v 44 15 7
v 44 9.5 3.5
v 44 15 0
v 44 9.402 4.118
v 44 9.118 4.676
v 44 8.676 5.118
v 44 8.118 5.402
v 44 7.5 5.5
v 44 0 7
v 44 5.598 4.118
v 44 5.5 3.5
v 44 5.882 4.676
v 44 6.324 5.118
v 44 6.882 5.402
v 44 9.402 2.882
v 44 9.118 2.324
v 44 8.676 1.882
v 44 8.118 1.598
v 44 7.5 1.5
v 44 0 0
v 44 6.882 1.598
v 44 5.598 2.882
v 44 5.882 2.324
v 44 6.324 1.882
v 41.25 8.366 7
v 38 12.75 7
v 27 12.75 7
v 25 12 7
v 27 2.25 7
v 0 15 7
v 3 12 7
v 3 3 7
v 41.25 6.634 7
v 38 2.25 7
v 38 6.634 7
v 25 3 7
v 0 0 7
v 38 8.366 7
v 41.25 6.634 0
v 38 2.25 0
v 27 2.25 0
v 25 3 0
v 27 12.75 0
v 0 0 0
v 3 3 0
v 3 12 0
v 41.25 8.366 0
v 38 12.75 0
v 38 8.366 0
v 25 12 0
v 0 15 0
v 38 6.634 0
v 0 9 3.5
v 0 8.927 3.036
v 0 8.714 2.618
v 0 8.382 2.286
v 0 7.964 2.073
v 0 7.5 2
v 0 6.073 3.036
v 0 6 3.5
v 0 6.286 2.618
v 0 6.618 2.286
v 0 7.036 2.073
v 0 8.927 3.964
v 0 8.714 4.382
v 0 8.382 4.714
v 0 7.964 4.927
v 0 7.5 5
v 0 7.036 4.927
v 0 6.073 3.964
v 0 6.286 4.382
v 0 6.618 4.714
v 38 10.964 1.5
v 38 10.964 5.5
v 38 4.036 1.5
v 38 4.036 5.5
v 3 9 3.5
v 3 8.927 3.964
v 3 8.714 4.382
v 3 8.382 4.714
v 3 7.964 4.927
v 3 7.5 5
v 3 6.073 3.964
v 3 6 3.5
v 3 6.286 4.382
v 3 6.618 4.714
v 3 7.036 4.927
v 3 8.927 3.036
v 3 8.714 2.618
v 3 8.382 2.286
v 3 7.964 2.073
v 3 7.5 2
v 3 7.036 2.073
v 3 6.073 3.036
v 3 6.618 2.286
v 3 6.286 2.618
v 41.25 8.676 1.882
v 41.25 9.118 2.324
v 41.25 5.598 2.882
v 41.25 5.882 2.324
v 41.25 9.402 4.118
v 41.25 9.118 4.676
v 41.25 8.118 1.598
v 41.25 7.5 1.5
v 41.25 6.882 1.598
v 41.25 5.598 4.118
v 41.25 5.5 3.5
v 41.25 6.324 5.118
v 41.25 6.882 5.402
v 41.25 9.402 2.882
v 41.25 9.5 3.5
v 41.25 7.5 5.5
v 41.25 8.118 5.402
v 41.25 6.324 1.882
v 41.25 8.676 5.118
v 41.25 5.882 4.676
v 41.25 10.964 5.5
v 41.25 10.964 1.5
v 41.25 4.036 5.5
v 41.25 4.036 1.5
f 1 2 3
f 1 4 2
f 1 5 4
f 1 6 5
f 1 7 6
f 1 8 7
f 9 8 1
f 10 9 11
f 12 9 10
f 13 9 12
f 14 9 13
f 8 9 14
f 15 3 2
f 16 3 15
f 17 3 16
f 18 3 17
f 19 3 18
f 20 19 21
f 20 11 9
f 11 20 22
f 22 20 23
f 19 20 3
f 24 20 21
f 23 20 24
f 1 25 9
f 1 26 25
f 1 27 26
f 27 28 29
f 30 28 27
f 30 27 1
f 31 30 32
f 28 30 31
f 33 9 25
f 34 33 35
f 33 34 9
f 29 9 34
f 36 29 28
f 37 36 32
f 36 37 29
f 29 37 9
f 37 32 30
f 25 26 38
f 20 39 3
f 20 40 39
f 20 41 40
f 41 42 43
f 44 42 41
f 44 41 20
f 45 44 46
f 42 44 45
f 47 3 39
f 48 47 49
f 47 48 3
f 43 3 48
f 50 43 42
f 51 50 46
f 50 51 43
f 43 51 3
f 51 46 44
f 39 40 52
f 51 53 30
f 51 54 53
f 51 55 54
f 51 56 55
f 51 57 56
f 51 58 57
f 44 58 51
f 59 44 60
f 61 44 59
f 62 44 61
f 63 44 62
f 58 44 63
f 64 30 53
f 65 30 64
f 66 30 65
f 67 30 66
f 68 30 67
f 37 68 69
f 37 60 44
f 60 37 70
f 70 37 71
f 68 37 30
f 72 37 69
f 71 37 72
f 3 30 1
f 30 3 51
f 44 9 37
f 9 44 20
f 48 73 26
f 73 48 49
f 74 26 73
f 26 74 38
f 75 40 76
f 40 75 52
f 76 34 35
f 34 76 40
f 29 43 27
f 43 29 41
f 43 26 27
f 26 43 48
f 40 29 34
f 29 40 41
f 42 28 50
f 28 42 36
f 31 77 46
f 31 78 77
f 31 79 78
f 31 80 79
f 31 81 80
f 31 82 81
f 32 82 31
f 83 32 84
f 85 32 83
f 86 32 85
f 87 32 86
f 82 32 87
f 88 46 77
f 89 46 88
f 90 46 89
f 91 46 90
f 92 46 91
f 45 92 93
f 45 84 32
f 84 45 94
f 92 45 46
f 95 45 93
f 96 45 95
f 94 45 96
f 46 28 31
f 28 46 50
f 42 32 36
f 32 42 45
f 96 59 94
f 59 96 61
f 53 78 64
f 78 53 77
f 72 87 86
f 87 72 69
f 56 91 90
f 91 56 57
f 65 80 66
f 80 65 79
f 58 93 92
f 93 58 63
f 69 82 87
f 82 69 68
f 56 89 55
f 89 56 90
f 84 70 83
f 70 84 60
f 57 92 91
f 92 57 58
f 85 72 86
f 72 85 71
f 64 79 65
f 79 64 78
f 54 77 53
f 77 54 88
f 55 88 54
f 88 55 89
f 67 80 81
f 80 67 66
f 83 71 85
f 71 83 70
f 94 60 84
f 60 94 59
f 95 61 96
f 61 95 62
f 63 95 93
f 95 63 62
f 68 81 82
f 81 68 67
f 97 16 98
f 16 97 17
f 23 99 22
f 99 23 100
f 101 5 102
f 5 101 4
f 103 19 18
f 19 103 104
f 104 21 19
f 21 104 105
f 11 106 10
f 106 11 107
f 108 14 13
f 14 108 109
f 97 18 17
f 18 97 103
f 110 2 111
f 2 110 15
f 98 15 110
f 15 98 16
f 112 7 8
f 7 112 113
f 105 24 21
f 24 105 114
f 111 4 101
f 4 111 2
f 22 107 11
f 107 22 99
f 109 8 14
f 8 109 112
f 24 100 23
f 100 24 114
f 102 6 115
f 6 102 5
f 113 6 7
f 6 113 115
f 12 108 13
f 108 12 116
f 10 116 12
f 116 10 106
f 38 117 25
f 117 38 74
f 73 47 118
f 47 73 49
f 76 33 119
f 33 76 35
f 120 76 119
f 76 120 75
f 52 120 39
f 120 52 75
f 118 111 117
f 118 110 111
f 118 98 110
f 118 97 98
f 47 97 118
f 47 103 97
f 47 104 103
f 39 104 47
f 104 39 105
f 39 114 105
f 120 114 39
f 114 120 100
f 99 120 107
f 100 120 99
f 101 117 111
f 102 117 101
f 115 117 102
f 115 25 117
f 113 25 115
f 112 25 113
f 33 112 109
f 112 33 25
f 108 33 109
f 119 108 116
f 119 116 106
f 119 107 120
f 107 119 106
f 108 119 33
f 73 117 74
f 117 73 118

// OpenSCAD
// file: ../basic_scad/config.scad
// Author: Mihai Oltean, www.tcreate.org, mihai.oltean@gmail.com
// More details: jenny5.org
// Source: github.com/jenny5-robot
// MIT License
//--------------------------------------------------------------

aluminium_color = "Silver";
screw_color = "LightSlateGray";
frame_color = aluminium_color;
shaft_color = "Silver";
plastic_color = "LimeGreen";
pulley_color = "DarkSlateGray";
// file: ../basic_scad/utils.scad
// Author: Mihai Oltean, www.tcreate.org, mihai.oltean@gmail.com
// More details: jenny5.org
// Source: github.com/jenny5-robot
// MIT License
//--------------------------------------------------------------

module colt(radius, height)
{
	difference(){
		cube ([radius, radius, height]);
		cylinder	(h = height, r = radius, $fn = 30);
	}
}
/////////////////////////////////////////////////////////////////////////////////////////////////////////////////////////
module colt_sferic(radius)
{
	difference(){
		cube ([radius, radius, radius]);
		sphere(r = radius, $fn = 40);
	}
}
/////////////////////////////////////////////////////////////////////////////////////////////////////////////////////////
module coloana_sferica(height, radius)
{
		difference(){
			cube ([height, height, height]);
			cylinder(h= height, r = radius, $fn = 50);
		}
}
/////////////////////////////////////////////////////////////////////////////////////////////////////////////////////////
// file: ../basic_scad/params_basic_components.scad
// Author: Mihai Oltean, www.tcreate.org, mihai.oltean@gmail.com
// More details: jenny5.org
// Source: github.com/jenny5-robot
// MIT License
//--------------------------------------------------------------

spring_length = 20;

smooth_rod_8_radius = 4;
smooth_rod_10_radius = 5;
smooth_rod_12_radius = 6;

tolerance = 0.1;
display_tolerance = 1;

overlap_tolerance = 0.01;


wall_thick_1 = 1;
wall_thick_2 = 2;
wall_thick_3 = 3;
wall_thick_4 = 4;
wall_thick_5 = 5;
wall_thick_5_5 = 5.5;
wall_thick_6 = 6;
wall_thick_7 = 7;
wall_thick_8 = 8;
wall_thick_9 = 9;
wall_thick_10 = 10;
wall_thick_12 = 10;

wrench_radius = 11;

ghidaj_radius = 4;
ghidaj_radius_12 = 6;

canal_diameter = 8.22;
canal_height = 2.2;

filament_radius = 0.9;

bowden_tube_radius = 2.5;

m3_tolerance = 0.1;

latura_mare_L = 40;
latura_mica_L = 15;
grosime_perete_L = 3;

latura_L_50x50 = 50;
latura_L_40x40 = 40;

latura_U_50x50 = 50;
latura_U_40x40 = 40;


tolerance_z = [0, 0, tolerance];
tolerance_x = [tolerance, 0, 0];
tolerance_y = [0, tolerance, 0];

display_tolerance_z = [0, 0, display_tolerance];
display_tolerance_x = [display_tolerance, 0, 0];
display_tolerance_y = [0, display_tolerance, 0];
// file: ../basic_scad/params_screws_nuts_washers.scad
m2_screw_radius = 1;
m2_nut_radius = 2.2;
m2_nut_height = 1.6;
m2_nut_thick = m2_nut_height;

m3_screw_radius = 1.5;
m3_nut_radius = 3.1;
m3_nut_height = 2.3;
m3_nut_thick = m3_nut_height;
m3_autolock_nut_thick = m3_nut_thick + 1;

m4_screw_radius = 2;
m4_nut_radius = 4;
m4_auto_lock_nut_height = 5;
m4_nut_height = 3.25;
m4_nut_thick = 3.25;

m5_screw_radius = 2.5;
m5_nut_radius = 4.6;
m5_nut_height = 4;

m6_screw_radius = 3;
m6_nut_radius = 5.65;
m6_nut_thick = 5;
m6_nut_slim_thick = 3;
m6_autolock_nut_thick = 6;
m6_long_nut_thick = 9;

m8_screw_head_height = 5.7;
m8_screw_radius = 3.9;
m8_nut_small_width = 12.8;
m8_nut_radius = 7.35;
m8_slim_nut_small_width = 12.4;
m8_nut_thick = 6.5;
m8_nut_height = m8_nut_thick;
m8_slim_nut_height = 5.5;
m8_screw_head_radius = 6.5;
m8_autolock_nut_thick = 8;

m10_screw_radius = 5;
m10_nut_thick = 8;
m10_nut_radius = 9.8;

m12_screw_radius = 6;
m12_nut_thick = 8;
m12_nut_radius = 11;

m10_long_nut_radius = 9.71;
m10_long_nut_height = 29.8;

m10_long_thick_nut_radius = 7.41;
m10_long_thick_nut_height = 30.4;

m12_plastic_nut_radius = 10.45;
m12_plastic_nut_height = 23.3;

tr12_3_nut_radius = 11;
tr12_3_nut_height = 18.1;

washer_5 = 0.97;

washer_4_12_radius = 6;
washer_4_12_external_radius = 6;
washer_4_12_thick = 1;
washer_4_thick = 1;
washer_4_12_internal_radius = 2.15;

washer_4_9_external_radius = 4.5;
washer_4_9_internal_radius = 2.15;
washer_4_9_thick = 1;

washer_6_thick = 1.5;
washer_8_thick = 1.5;
washer_5_thick = 1;

washer_10_height = 2;
// file: ../basic_scad/params_ultrasound.scad
// Author: Mihai Oltean, www.tcreate.org, mihai.oltean@gmail.com
// More details: jenny5.org
// Source: github.com/jenny5-robot
// MIT License
//--------------------------------------------------------------

hc_sr04_sizes = [45.2, 20.5, 0];
hc_sr04_arm_sizes = [44, 15, 7];

hc_sr04_dist_to_holes = 0.75;

hc_sr04_hole_position = [
[hc_sr04_dist_to_holes, hc_sr04_dist_to_holes, 0], 
[hc_sr04_dist_to_holes + 42.5, hc_sr04_dist_to_holes, 0],
[hc_sr04_dist_to_holes + 42.5, hc_sr04_dist_to_holes + 17.5, 0],
[hc_sr04_dist_to_holes, hc_sr04_dist_to_holes + 17.5, 0]
];
// main file
// Author: Mihai Oltean, www.tcreate.org, mihai.oltean@gmail.com
// More details: jenny5.org
// Source: github.com/jenny5-robot
// MIT License
//--------------------------------------------------------------

include <../basic_scad/params_ultrasound.scad>
include <../basic_scad/params_screws_nuts_washers.scad>
use <../basic_scad/basic_components.scad>


//--------------------------------------------------------------
module hc_sr04_support()
{
  difference(){
    
    union(){
      my_cube_rounded2([hc_sr04_sizes[0] + 2, hc_sr04_sizes[1] + 2, 3]);
      for (i = [0:3])
        translate([1.5, 1.5, 0])
          translate (hc_sr04_hole_position[i]) 
            cylinder (h = 7, r = 2, $fn = 20);
    }
    for (i = [0:3])
      translate([1.5, 1.5, 0])
        translate (hc_sr04_hole_position[i]) 
          cylinder (h = 7, r = 1, $fn = 20);
    
    translate([0, 1, 0])
      translate ([3.5, hc_sr04_sizes[1] / 2, 0])
        cylinder (h = 3, r = 1.5, $fn = 20);
  }
}
//--------------------------------------------------------------
module hc_sr04_arm()
{
    
    difference(){
      cube(hc_sr04_arm_sizes);
        // bone's hole
        translate ([hc_sr04_arm_sizes[0] - 11 - 6, (hc_sr04_arm_sizes[1] - 10.5) / 2, -1]) cube([11, 10.5, 9]);
        // other hole
        translate ([3, 3, -1]) cube([22, hc_sr04_arm_sizes[1] - 6, 9]);
        
        translate([0, hc_sr04_arm_sizes[1] / 2, hc_sr04_arm_sizes[2] / 2]) rotate([0, 90, 0]) cylinder (h = 3, r = m3_screw_radius, $fn = 20);
        // screw hole
        translate([34, hc_sr04_arm_sizes[1] / 2, hc_sr04_arm_sizes[2] / 2]) rotate([0, 90, 0]) cylinder (h = 10, r = m4_screw_radius, $fn = 20);
        // nut hole
        translate([hc_sr04_arm_sizes[0] - 6, hc_sr04_arm_sizes[1] / 2, hc_sr04_arm_sizes[2] / 2]) rotate([0, 90, 0]) cylinder (h = m4_nut_thick, r = m4_nut_radius, $fn = 6);
        
    }
}
//--------------------------------------------------------------

//hc_sr04_support();
hc_sr04_arm();
